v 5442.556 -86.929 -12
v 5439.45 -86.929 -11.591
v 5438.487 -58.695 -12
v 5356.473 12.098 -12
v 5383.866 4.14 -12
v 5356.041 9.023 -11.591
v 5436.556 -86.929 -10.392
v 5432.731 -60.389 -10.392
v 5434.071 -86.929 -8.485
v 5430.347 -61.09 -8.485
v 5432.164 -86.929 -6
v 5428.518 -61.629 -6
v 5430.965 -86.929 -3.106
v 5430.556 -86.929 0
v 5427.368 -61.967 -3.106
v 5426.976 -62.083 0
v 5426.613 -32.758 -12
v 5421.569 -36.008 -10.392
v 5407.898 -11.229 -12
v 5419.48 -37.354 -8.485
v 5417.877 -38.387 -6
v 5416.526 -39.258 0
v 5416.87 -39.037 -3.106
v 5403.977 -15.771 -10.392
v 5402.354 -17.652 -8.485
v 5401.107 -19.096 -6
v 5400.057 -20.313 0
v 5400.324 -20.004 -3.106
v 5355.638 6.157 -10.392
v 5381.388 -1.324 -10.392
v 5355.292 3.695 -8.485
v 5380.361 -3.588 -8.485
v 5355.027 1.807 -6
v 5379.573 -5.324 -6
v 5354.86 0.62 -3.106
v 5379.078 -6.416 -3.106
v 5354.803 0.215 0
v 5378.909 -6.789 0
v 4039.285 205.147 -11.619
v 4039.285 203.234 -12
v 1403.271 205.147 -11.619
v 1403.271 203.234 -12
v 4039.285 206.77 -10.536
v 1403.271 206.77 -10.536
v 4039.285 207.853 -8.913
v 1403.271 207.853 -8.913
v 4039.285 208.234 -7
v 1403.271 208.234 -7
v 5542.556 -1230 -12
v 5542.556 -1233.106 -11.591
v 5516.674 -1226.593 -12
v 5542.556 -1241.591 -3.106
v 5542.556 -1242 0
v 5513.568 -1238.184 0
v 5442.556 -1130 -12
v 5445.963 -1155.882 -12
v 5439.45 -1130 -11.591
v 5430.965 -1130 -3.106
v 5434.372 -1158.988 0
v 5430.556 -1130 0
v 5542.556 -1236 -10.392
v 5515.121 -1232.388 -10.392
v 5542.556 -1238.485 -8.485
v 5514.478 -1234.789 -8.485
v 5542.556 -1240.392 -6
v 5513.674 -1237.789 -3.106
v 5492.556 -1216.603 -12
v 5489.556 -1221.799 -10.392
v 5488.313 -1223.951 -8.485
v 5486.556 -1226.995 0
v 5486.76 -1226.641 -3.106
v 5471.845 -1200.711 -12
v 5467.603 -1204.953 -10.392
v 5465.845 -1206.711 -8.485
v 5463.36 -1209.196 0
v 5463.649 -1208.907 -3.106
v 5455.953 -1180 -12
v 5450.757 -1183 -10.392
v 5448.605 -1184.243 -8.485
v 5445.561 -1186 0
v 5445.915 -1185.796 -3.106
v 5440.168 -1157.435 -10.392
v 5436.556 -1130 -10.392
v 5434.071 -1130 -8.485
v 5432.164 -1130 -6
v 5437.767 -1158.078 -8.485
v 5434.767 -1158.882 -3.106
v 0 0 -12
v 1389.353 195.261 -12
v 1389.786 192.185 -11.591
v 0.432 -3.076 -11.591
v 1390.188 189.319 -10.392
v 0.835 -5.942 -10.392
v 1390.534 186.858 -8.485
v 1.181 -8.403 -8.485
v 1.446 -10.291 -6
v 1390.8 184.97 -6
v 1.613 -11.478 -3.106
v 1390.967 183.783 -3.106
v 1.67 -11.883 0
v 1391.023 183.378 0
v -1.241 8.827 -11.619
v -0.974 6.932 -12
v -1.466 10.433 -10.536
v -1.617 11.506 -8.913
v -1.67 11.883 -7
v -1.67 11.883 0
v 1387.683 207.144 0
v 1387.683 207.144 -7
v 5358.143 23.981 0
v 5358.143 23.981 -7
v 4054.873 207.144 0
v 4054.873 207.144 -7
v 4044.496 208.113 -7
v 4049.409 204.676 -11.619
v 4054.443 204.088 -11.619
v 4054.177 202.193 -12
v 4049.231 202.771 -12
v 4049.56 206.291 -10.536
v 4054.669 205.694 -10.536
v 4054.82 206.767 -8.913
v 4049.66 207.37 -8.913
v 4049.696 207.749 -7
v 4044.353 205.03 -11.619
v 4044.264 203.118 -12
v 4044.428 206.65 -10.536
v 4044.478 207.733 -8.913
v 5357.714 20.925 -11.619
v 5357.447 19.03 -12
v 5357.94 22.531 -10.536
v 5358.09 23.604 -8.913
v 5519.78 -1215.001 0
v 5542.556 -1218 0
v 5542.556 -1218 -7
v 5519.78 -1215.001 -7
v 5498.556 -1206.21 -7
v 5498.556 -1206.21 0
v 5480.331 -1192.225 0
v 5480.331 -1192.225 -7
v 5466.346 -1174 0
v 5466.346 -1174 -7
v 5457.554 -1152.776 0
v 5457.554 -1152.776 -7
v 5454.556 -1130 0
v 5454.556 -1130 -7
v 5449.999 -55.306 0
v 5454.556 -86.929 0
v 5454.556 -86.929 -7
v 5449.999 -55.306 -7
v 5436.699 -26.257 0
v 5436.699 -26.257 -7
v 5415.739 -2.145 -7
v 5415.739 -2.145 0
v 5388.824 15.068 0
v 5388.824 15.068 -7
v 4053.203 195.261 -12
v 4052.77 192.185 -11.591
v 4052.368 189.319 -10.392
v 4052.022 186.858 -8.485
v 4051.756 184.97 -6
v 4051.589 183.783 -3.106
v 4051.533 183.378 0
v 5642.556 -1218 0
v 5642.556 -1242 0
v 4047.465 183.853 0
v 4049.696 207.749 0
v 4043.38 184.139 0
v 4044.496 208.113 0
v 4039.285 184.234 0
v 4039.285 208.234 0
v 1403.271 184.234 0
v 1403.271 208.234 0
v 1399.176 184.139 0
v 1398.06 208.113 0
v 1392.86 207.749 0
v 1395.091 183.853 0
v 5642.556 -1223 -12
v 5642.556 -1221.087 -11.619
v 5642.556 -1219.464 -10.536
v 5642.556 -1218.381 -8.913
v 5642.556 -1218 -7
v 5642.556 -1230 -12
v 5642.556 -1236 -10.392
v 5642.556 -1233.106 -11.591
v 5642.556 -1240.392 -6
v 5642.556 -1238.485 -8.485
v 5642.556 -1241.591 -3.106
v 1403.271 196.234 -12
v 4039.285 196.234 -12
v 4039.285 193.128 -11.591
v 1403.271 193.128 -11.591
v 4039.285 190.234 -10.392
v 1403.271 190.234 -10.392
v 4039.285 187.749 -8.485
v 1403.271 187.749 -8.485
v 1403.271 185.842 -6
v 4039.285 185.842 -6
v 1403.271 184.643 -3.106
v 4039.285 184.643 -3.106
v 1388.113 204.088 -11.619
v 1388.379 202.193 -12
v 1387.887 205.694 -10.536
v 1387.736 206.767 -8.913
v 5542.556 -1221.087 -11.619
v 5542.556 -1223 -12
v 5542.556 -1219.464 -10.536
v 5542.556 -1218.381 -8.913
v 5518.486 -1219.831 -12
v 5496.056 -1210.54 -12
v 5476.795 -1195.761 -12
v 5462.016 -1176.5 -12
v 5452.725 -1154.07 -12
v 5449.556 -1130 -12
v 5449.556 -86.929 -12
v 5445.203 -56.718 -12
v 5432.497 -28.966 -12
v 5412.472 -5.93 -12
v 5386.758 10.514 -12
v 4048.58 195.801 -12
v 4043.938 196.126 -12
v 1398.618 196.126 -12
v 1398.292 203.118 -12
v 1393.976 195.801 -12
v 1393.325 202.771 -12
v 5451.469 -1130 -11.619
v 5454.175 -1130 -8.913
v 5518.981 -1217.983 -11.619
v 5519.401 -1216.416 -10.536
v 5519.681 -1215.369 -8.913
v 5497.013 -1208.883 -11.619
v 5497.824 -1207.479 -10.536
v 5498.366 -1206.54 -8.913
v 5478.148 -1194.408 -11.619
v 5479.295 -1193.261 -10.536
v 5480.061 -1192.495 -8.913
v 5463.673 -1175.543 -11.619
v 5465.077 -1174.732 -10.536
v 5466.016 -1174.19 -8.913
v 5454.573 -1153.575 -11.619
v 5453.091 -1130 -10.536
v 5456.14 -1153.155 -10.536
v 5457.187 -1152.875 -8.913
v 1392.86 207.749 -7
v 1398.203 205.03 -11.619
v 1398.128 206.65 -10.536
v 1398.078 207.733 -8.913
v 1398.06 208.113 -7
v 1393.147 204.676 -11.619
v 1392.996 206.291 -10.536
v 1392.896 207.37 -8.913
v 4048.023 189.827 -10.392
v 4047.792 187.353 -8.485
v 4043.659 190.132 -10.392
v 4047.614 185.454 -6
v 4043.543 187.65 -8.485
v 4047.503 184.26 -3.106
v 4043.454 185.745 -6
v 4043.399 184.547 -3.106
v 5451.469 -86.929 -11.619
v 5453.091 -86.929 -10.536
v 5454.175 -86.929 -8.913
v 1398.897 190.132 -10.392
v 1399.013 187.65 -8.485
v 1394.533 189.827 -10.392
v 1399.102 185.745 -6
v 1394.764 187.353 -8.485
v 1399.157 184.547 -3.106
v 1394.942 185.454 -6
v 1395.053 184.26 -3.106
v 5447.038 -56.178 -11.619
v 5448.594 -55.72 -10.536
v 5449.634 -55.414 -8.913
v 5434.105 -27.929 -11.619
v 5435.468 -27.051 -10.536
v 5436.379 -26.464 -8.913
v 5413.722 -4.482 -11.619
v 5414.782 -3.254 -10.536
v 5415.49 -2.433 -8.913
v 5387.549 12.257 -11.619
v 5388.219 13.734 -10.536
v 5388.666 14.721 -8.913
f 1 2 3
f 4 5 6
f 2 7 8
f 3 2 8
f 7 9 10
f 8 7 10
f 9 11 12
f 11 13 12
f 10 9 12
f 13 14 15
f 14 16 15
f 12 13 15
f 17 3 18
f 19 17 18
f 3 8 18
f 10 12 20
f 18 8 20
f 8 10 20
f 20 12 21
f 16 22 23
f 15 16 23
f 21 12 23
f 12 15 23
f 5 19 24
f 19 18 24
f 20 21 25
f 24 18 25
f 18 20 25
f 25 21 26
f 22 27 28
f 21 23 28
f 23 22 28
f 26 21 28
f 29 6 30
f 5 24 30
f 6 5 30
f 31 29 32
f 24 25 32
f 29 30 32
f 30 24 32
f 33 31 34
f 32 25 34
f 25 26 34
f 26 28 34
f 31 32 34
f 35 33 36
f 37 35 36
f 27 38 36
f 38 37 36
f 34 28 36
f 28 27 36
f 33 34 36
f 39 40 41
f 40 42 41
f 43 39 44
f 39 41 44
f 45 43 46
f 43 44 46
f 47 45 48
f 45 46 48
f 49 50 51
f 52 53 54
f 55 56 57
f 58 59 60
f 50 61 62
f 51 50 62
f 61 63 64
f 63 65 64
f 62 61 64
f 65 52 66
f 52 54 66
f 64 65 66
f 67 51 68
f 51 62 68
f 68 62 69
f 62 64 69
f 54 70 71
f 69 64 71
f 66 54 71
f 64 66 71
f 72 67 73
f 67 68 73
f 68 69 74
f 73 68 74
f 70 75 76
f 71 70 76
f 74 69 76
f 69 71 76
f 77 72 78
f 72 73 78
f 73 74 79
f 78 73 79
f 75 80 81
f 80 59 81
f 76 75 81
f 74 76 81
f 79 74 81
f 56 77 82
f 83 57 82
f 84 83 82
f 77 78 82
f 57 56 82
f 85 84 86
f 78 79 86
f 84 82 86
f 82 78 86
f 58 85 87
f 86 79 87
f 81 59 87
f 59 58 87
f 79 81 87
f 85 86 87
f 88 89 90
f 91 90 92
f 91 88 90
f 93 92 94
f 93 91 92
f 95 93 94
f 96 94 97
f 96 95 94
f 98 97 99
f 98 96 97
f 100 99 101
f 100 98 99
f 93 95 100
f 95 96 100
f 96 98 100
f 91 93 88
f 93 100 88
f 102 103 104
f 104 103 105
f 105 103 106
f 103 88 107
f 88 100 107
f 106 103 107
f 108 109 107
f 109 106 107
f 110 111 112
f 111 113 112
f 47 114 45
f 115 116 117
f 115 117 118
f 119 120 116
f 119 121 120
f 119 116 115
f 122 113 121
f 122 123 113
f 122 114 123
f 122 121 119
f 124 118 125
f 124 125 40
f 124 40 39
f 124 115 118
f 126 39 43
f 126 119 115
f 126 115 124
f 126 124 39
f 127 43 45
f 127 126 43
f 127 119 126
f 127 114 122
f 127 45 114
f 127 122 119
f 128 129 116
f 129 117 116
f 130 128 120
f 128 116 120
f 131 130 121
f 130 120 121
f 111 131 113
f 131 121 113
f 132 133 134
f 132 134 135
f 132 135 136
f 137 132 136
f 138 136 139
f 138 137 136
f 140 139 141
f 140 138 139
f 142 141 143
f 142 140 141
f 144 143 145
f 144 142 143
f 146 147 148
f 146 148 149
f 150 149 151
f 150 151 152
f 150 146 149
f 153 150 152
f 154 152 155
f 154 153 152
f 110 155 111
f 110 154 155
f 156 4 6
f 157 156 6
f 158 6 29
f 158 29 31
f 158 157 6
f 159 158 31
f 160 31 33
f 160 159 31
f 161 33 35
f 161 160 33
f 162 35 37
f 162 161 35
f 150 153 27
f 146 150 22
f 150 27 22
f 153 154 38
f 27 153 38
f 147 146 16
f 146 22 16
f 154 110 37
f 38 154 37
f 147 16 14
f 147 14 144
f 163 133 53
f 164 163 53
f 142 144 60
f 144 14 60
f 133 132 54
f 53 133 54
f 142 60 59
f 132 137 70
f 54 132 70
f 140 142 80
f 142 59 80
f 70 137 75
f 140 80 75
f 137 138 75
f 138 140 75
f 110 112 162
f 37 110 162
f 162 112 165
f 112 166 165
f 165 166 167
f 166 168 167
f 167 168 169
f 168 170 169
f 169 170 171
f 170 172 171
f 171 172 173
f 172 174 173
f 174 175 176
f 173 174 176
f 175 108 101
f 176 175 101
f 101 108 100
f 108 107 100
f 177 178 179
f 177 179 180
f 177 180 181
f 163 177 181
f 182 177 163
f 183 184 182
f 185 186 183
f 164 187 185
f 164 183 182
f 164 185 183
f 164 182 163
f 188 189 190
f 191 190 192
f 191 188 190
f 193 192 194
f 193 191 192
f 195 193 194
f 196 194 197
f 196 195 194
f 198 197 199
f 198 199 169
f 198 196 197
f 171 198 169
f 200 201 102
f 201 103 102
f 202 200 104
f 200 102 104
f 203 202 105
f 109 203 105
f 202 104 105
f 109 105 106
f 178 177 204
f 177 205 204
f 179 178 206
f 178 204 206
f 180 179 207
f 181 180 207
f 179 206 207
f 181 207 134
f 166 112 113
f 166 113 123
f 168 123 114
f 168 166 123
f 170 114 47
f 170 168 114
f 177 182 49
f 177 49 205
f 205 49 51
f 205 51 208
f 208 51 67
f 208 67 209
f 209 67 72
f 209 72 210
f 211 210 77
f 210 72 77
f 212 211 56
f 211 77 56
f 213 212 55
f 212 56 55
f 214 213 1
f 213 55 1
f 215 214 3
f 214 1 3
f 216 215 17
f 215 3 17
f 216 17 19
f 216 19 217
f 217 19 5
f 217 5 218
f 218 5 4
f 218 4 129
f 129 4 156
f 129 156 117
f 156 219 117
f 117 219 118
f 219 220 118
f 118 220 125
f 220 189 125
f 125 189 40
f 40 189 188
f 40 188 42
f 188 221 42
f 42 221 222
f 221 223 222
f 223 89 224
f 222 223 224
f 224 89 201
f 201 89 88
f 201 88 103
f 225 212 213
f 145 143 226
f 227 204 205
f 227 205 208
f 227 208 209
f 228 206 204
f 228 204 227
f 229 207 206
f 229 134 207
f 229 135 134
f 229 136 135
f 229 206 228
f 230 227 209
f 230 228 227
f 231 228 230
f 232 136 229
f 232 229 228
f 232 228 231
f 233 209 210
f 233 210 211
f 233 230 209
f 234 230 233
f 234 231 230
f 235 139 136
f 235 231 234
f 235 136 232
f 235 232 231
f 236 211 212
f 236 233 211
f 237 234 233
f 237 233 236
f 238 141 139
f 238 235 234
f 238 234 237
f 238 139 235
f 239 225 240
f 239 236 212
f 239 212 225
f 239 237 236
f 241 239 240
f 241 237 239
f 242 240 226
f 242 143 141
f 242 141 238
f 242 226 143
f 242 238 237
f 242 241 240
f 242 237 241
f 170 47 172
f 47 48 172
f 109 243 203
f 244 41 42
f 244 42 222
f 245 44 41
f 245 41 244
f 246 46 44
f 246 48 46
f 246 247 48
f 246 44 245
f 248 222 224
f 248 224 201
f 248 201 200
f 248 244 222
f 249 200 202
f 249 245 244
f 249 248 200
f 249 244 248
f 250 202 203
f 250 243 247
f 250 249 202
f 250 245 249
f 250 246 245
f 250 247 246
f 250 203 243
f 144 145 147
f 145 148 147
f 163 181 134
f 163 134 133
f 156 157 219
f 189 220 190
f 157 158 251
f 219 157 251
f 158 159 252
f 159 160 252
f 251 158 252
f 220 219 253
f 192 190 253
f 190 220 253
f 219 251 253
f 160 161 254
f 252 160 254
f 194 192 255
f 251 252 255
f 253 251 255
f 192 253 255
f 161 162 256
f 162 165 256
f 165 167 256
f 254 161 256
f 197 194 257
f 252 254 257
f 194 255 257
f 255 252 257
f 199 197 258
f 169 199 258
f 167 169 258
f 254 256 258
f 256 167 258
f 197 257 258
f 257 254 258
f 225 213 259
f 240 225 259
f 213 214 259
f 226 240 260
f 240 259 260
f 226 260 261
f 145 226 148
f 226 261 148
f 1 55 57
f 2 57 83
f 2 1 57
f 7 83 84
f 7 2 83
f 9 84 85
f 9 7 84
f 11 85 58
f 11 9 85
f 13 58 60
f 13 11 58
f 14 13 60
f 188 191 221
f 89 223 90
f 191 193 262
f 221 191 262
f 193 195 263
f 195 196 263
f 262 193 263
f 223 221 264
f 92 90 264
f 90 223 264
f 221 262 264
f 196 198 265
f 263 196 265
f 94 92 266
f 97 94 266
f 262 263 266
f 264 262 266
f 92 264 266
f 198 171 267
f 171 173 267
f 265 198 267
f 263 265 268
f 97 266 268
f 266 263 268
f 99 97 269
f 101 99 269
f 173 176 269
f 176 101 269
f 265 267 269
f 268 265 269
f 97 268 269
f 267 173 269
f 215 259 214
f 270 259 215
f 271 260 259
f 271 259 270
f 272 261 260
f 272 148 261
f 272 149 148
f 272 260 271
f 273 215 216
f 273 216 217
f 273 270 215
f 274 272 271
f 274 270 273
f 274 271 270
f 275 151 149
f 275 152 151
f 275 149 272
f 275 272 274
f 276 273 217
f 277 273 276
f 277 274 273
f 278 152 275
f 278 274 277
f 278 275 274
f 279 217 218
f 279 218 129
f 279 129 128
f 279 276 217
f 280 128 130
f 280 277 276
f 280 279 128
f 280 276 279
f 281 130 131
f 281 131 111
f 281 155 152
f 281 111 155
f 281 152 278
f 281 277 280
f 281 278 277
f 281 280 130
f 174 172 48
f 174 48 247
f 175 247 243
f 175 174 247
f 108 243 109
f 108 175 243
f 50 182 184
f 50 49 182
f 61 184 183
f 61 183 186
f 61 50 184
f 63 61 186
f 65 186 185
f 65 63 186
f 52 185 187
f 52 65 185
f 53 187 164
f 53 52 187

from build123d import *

# Parameters (mm, degrees)
F2_W = 24
F2_H = 12
F4_R = 5
F5_R = 11.99999


# Not quite as in the source:
# - a fillet or chamfer is up to 0.001 mm smaller than in the source, because OpenCascade refuses the exact size


with BuildPart() as f3:
    # F3: sweep along a path in F0
    with BuildLine(Plane.XY) as f3_path:
        Line((5642.5559538512, -1230), (5542.5559538512, -1230))
        ThreePointArc((5542.5559538512, -1230), (5471.8452757326, -1200.7106781187), (5442.5559538512, -1130))
        Line((5442.5559538512, -1130), (5442.5559538512, -86.9286737816))
        ThreePointArc((5442.5559538512, -86.9286737816), (5418.0269118735, -21.3227708826), (5356.4732639472, 12.0981330925))
        Line((5356.4732639472, 12.0981330925), (4053.2026058273, 195.2608792278))
        ThreePointArc((4053.2026058273, 195.2608792278), (4046.2609431057, 195.9904773797), (4039.2852957313, 196.2340723537))
        Line((4039.2852957313, 196.2340723537), (1403.27065812, 196.2340723537))
        ThreePointArc((1403.27065812, 196.2340723537), (1396.2950107456, 195.9904773797), (1389.353348024, 195.2608792278))
        Line((1389.353348024, 195.2608792278), (0, 0))
    # F2 (on line) → F3 (sweep)
    with BuildSketch(Plane.YZ.offset(5642.5559538512)):
        with Locations((-1230, -6)):
            Rectangle(F2_W, F2_H)
    sweep(path=f3_path.line)

    # F4
    f4_edges = [f3.edges().sort_by_distance(p)[0] for p in [
        (5592.555954, -1218, -12),
    ]]
    fillet(f4_edges, radius=F4_R)

    # F5 (radius 12 in the source; OpenCascade refuses exactly that, so slightly less here)
    f5_edges = [f3.edges().sort_by_distance(p)[0] for p in [
        (5592.555954, -1242, -12),
    ]]
    fillet(f5_edges, radius=F5_R)


solid = f3.part
